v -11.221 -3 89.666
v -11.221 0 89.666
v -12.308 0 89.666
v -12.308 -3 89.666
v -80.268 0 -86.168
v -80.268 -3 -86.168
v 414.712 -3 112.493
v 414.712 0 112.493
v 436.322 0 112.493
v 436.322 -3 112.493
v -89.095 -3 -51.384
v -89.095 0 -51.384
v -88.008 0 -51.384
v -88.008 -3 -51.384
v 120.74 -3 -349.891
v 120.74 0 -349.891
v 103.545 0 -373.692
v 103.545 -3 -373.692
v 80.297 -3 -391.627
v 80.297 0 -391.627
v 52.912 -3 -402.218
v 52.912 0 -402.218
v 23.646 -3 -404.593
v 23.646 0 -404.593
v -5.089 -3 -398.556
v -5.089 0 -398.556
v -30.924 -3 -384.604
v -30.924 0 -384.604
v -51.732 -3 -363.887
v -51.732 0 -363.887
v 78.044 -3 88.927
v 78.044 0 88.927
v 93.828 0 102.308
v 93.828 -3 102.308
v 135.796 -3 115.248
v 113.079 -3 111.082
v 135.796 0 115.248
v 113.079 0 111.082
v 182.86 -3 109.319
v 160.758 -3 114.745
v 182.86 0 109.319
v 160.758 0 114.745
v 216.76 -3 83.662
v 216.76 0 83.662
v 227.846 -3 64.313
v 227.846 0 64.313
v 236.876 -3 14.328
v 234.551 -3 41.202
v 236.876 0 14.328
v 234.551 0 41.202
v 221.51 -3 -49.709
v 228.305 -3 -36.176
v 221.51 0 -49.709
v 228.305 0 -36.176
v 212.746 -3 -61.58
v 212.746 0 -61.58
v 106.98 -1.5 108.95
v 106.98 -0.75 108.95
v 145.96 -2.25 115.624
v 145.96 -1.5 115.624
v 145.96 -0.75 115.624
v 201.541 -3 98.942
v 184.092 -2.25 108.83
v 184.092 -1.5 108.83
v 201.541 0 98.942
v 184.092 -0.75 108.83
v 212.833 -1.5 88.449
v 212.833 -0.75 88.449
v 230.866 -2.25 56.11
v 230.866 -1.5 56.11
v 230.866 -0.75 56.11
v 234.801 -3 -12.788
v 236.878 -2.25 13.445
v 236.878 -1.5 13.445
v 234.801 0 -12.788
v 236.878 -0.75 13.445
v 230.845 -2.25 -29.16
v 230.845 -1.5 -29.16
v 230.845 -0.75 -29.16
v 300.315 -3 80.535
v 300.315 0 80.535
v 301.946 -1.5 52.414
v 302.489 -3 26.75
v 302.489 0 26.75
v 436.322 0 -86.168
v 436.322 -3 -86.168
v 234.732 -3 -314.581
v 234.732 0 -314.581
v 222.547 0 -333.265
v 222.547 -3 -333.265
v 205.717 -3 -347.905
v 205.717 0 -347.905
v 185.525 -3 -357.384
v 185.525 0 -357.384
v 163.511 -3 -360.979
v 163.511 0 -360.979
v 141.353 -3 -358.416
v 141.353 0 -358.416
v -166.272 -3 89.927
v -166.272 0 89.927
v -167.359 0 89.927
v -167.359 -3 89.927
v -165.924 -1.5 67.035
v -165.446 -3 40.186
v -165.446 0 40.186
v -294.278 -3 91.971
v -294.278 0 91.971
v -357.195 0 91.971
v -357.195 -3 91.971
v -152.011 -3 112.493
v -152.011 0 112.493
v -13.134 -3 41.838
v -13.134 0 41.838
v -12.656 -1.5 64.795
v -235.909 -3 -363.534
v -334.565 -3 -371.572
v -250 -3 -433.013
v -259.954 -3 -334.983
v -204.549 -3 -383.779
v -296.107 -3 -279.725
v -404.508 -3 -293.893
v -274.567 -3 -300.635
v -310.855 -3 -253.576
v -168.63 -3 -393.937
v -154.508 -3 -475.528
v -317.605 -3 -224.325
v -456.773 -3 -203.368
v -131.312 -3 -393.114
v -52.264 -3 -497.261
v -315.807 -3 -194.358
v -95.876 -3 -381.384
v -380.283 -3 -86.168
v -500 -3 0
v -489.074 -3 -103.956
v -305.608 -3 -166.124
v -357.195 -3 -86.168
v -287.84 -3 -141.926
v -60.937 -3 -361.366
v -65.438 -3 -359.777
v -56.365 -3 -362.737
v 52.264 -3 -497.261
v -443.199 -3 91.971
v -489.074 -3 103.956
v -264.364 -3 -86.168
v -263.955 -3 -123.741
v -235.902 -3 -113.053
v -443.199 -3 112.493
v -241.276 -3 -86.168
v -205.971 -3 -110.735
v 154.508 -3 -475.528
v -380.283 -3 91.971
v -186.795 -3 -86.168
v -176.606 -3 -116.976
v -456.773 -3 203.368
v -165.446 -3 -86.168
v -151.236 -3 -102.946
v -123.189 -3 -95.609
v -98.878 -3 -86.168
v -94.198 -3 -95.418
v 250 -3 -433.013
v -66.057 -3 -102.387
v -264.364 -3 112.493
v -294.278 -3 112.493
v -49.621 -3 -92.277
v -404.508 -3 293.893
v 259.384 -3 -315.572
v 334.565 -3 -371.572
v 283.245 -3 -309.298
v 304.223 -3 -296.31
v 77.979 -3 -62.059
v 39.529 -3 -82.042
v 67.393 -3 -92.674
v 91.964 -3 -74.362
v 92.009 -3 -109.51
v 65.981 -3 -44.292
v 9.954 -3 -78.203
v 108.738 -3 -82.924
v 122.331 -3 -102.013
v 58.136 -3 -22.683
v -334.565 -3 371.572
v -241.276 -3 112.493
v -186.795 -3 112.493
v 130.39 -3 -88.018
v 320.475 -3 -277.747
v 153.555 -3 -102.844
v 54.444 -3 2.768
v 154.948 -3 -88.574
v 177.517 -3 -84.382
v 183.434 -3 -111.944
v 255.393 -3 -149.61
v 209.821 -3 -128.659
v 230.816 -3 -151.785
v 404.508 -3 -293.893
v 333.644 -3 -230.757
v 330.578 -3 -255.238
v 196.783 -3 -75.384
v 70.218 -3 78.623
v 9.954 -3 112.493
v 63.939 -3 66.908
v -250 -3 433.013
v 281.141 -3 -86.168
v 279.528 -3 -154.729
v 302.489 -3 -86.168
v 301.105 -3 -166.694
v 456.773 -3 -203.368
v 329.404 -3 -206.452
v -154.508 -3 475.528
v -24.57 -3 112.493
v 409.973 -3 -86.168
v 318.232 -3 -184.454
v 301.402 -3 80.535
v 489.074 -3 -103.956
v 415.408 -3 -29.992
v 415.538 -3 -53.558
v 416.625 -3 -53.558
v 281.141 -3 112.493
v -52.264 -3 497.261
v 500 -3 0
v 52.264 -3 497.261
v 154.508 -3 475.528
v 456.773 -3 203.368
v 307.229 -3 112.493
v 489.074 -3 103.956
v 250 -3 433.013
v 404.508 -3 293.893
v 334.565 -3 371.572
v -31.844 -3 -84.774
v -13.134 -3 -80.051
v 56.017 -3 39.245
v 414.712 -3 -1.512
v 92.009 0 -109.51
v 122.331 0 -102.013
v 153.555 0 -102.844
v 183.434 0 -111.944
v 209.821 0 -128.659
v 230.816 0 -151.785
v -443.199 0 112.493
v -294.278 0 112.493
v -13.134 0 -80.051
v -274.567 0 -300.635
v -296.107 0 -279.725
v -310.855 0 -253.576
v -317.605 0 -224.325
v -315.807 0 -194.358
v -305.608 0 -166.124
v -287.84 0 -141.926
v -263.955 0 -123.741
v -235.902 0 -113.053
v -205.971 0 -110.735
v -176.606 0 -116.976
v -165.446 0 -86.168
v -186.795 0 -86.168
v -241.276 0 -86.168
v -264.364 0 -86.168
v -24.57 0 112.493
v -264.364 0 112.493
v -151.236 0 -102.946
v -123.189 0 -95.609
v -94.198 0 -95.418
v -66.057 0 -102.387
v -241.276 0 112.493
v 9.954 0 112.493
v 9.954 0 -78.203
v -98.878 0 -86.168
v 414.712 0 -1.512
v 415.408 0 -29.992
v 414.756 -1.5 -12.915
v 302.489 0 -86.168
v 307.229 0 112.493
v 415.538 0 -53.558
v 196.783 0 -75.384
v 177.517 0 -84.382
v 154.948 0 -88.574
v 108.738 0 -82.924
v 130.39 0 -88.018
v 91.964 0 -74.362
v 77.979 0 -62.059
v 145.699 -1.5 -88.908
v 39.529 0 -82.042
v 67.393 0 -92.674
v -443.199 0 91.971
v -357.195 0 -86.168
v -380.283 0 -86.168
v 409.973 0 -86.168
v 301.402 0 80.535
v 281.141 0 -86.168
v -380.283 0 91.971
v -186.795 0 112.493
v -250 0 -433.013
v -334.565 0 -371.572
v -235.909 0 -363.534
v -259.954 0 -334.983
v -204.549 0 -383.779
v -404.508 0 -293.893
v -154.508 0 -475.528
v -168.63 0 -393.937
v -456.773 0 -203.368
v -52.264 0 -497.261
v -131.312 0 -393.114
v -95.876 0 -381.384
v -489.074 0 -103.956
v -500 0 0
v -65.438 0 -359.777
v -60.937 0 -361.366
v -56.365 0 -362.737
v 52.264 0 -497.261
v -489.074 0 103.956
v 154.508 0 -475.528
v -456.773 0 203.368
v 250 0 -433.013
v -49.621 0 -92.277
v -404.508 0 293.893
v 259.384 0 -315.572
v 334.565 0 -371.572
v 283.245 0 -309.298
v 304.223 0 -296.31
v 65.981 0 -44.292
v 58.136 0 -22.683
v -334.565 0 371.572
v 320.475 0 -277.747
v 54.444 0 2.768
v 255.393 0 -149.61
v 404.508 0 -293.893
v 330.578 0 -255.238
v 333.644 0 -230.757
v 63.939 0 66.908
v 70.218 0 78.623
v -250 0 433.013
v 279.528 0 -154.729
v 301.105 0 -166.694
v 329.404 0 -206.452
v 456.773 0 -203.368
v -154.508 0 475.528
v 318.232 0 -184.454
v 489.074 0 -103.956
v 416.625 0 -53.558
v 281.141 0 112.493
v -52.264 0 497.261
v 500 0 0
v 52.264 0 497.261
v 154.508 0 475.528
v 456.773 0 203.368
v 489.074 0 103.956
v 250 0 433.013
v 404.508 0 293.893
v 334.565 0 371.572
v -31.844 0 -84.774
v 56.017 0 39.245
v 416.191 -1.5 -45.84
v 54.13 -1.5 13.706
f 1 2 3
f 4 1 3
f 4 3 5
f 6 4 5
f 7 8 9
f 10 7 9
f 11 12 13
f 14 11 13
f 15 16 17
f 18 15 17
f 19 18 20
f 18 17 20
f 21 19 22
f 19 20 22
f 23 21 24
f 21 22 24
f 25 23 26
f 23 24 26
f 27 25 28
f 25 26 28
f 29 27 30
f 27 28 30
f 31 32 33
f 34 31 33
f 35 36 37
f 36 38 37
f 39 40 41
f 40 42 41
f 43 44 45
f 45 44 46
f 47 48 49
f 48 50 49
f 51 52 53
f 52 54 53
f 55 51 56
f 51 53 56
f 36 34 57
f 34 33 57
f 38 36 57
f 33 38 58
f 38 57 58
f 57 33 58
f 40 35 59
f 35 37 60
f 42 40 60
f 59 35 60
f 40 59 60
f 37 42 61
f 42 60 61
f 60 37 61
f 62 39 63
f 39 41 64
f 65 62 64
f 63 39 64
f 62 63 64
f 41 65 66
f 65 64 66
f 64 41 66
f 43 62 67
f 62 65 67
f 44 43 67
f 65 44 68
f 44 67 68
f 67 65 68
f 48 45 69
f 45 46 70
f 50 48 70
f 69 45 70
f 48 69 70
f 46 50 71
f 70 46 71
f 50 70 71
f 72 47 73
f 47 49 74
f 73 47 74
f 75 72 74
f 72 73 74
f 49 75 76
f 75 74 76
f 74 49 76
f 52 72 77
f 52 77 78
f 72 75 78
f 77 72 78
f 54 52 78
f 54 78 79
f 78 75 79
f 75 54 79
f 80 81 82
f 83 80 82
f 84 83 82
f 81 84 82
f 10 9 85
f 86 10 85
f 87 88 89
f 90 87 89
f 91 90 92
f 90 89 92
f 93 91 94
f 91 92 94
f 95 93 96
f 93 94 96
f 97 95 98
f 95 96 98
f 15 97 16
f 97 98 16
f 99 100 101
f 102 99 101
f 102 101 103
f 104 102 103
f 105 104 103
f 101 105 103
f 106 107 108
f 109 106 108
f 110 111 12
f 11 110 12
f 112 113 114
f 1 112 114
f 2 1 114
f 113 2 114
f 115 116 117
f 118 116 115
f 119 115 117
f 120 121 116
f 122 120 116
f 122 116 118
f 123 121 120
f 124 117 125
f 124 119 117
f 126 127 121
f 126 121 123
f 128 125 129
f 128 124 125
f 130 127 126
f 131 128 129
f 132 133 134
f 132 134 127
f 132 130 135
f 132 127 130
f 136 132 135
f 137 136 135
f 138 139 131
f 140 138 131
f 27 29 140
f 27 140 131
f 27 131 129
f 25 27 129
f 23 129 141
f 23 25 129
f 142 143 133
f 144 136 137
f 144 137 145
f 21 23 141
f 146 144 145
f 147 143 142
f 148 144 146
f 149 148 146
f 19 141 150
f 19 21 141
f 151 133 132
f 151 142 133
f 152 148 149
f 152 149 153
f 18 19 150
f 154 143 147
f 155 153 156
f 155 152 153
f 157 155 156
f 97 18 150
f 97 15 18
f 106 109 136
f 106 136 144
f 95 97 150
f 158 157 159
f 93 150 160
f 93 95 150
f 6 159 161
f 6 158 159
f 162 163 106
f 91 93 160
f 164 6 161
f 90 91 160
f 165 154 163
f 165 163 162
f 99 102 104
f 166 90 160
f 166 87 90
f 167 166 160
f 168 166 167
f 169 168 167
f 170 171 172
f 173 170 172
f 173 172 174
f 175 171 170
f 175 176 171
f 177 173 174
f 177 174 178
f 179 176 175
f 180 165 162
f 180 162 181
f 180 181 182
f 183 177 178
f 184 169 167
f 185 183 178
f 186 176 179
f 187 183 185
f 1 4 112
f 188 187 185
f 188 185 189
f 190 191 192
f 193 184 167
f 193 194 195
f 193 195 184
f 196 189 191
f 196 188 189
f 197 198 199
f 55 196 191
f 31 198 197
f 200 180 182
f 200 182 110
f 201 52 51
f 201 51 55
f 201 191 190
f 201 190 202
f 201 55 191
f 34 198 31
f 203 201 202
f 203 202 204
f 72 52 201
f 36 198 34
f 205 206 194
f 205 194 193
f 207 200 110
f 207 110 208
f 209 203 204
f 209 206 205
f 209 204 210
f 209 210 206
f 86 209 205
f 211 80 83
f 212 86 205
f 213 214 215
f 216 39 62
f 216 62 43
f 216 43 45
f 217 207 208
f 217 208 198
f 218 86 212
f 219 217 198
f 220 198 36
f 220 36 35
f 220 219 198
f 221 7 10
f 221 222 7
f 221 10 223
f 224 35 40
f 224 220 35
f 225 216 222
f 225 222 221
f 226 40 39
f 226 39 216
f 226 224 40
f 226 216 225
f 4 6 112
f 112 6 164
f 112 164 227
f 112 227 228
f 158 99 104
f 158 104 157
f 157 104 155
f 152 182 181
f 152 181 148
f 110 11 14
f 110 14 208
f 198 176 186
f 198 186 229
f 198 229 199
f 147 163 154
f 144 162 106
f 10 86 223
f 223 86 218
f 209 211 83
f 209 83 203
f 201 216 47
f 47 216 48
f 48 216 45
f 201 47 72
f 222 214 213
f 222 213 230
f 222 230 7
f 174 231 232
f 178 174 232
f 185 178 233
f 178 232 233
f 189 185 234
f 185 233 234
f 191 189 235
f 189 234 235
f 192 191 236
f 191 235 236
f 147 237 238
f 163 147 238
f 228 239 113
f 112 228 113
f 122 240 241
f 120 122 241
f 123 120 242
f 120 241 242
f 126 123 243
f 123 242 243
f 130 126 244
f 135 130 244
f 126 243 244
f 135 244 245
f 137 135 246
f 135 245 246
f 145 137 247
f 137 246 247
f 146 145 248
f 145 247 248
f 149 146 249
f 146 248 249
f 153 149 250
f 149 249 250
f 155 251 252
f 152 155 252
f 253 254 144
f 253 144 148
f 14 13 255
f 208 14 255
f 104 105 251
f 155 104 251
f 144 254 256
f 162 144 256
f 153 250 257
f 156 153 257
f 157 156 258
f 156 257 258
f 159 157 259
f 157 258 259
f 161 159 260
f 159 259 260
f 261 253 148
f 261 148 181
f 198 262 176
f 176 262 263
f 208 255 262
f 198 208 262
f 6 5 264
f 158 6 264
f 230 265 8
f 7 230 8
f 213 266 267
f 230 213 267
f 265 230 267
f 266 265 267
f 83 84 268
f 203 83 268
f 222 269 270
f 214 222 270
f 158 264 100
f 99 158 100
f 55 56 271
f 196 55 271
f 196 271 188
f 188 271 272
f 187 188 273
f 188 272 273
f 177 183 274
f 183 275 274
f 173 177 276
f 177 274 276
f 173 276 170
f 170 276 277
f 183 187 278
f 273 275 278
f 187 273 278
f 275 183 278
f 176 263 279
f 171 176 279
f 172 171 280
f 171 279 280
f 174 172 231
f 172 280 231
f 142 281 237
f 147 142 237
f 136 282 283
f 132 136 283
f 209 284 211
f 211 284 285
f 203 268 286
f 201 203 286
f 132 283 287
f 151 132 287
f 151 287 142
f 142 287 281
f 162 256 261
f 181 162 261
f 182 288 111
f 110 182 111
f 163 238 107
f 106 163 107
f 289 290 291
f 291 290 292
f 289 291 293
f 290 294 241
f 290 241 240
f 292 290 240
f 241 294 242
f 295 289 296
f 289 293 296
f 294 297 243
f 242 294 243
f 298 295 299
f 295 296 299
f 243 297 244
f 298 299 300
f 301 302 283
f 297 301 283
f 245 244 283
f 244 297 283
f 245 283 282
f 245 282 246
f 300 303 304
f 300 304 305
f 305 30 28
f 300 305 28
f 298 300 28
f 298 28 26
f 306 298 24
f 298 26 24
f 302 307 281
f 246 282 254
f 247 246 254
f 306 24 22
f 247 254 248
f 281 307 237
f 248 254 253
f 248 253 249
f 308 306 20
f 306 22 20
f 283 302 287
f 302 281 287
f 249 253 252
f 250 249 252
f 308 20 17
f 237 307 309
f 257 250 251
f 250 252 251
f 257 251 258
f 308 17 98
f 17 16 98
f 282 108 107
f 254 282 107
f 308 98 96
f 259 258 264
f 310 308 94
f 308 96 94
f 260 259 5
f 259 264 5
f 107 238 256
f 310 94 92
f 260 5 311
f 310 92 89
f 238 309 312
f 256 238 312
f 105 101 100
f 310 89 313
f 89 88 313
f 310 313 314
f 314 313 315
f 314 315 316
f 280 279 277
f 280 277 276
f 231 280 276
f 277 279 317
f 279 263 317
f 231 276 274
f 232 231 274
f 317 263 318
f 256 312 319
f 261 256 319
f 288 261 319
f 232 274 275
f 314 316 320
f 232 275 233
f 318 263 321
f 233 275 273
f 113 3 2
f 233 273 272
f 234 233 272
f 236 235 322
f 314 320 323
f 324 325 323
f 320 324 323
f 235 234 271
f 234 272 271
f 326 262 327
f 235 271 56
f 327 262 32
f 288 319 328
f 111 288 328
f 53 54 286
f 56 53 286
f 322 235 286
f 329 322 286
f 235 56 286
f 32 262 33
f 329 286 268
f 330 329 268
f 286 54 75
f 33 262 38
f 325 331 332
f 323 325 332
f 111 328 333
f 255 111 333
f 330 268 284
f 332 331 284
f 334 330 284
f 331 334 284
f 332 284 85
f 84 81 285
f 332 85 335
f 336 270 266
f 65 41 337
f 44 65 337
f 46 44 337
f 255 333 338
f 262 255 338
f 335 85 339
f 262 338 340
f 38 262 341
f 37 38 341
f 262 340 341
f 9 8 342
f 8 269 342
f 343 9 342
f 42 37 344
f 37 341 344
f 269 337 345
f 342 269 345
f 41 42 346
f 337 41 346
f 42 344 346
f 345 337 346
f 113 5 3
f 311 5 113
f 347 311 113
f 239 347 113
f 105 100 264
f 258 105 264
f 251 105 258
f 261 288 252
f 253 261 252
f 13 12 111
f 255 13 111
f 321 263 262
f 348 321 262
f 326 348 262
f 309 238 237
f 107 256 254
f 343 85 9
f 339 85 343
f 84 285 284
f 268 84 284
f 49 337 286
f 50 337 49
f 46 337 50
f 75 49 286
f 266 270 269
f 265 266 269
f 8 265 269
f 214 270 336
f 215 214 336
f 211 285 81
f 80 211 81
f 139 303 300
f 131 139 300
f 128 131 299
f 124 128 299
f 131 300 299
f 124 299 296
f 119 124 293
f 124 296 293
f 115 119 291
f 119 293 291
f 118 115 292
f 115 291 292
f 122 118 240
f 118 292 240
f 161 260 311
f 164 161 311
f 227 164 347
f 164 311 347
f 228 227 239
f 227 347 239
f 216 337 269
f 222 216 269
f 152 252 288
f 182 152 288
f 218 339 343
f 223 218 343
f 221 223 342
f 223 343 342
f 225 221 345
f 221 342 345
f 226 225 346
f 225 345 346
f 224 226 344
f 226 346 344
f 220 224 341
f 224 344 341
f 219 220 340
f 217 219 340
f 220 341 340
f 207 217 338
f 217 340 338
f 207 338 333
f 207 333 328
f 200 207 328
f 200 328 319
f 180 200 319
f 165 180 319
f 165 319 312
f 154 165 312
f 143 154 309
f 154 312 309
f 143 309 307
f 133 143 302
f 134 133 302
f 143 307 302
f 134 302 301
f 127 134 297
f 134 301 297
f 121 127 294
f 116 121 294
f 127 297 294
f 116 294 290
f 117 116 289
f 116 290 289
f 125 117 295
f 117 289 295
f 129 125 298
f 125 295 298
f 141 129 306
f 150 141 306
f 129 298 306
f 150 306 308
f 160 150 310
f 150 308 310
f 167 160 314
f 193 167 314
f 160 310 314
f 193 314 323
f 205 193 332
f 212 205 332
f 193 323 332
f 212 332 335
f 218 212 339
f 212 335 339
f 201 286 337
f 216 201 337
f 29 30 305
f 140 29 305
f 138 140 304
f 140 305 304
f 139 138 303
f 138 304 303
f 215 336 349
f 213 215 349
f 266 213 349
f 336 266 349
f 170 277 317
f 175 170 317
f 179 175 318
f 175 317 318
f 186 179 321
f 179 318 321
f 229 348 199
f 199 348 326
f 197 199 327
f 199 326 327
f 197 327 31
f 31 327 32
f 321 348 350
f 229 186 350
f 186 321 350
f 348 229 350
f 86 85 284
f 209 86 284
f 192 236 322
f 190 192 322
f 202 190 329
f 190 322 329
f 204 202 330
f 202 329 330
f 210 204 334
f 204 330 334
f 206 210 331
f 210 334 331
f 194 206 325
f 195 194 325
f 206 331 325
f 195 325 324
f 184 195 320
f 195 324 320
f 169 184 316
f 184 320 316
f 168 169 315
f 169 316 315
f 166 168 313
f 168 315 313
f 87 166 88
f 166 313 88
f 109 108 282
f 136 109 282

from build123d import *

# Parameters (mm, degrees)
F0_R     = 500
F0_W     = 23.0880718875
F0_H     = 198.6617711001
F1_DEPTH = 3


with BuildPart() as f1:
    # F0 (on Front) → F1 (new body)
    with BuildSketch(Plane.XZ):
        Circle(F0_R)
        with BuildLine():
            ThreePointArc((-274.567418569, -300.6351906095), (-305.6079419009, -166.1235155196), (-176.6063983823, -116.975711967))
            ThreePointArc((-176.6063983823, -116.975711967), (-123.1889327411, -95.6085057867), (-66.0571388124, -102.3865038656))
            ThreePointArc((-66.0571388124, -102.3865038656), (-40.8752164599, -88.187383642), (-13.1344654752, -80.0513549242))
            Line((-13.1344654752, -80.0513549242), (-13.1344654752, 41.8377829303))
            add(Edge.make_bspline(
                [(-13.1344654752, 41.8377829303), (-13.1344654752, 63.8388457836), (-11.2213295749, 89.6661804375)],
                knots=[0, 0, 0, 1, 1, 1], degree=2))
            Line((-11.2213295749, 89.6661804375), (-12.3083386092, 89.6661804375))
            Line((-12.3083386092, 89.6661804375), (-80.2681434307, -86.1684009433))
            Line((-80.2681434307, -86.1684009433), (-98.8777380971, -86.1684009433))
            Line((-98.8777380971, -86.1684009433), (-166.2722982207, 89.9270626057))
            Line((-166.2722982207, 89.9270626057), (-167.359307255, 89.9270626057))
            add(Edge.make_bspline(
                [(-167.359307255, 89.9270626057), (-165.4461713547, 69.0130087867), (-165.4461713547, 40.1855291983)],
                knots=[0, 0, 0, 1, 1, 1], degree=2))
            Line((-165.4461713547, 40.1855291983), (-165.4461713547, -86.1684009433))
            Line((-165.4461713547, -86.1684009433), (-186.7950287874, -86.1684009433))
            Line((-186.7950287874, -86.1684009433), (-186.7950287874, 112.4933701568))
            Line((-186.7950287874, 112.4933701568), (-152.0107396913, 112.4933701568))
            Line((-152.0107396913, 112.4933701568), (-89.0946567888, -51.3841118472))
            Line((-89.0946567888, -51.3841118472), (-88.0076477545, -51.3841118472))
            Line((-88.0076477545, -51.3841118472), (-24.5698005155, 112.4933701568))
            Line((-24.5698005155, 112.4933701568), (9.9536064123, 112.4933701568))
            Line((9.9536064123, 112.4933701568), (9.9536064123, -78.2026726688))
            ThreePointArc((9.9536064123, -78.2026726688), (53.773823289, -86.5372862236), (92.0090216607, -109.5100264977))
            ThreePointArc((92.0090216607, -109.5100264977), (168.8010036172, -106.3879816048), (230.8163361906, -151.7846134505))
            ThreePointArc((230.8163361906, -151.7846134505), (301.8959936917, -167.3086216291), (333.6679179608, -232.7598047248))
            ThreePointArc((333.6679179608, -232.7598047248), (303.4547141219, -296.9531582441), (234.7315185471, -314.581167554))
            ThreePointArc((234.7315185471, -314.581167554), (185.5253099789, -357.3835232893), (120.7398090278, -349.8914284782))
            ThreePointArc((120.7398090278, -349.8914284782), (38.3642732882, -404.4610167035), (-51.7318220906, -363.886856885))
            ThreePointArc((-51.7318220905, -363.886856885), (-58.6591581618, -362.0786424357), (-65.4384116096, -359.7766113262))
            ThreePointArc((-65.4384116096, -359.7766113262), (-186.9682580881, -390.1967718511), (-274.567418569, -300.6351906095))
        make_face(mode=Mode.SUBTRACT)
        Polygon((-357.1945649969, 91.9706395901), (-357.1945649969, -86.1684009433), (-380.2826368844, -86.1684009433), (-380.2826368844, 91.9706395901), (-443.198719787, 91.9706395901), (-443.198719787, 112.4933701568), (-294.2784820944, 112.4933701568), (-294.2784820944, 91.9706395901), align=None, mode=Mode.SUBTRACT)
        with Locations((-252.819957528, 13.1624846067)):
            Rectangle(F0_W, F0_H, mode=Mode.SUBTRACT)
        with BuildLine():
            add(Edge.make_bspline(
                [(212.8329725653, 88.4487303191), (236.877612403, 61.2735044628), (236.877612403, 13.4451069557)],
                knots=[0, 0, 0, 1, 1, 1], degree=2))
            add(Edge.make_bspline(
                [(236.877612403, 13.4451069557), (236.877612403, -34.2528494674), (212.7460118425, -61.5802565885)],
                knots=[0, 0, 0, 1, 1, 1], degree=2))
            add(Edge.make_bspline(
                [(212.7460118425, -61.5802565885), (188.6144112821, -88.9076637096), (145.6992946098, -88.9076637096)],
                knots=[0, 0, 0, 1, 1, 1], degree=2))
            add(Edge.make_bspline(
                [(145.6992946098, -88.9076637096), (101.8276099874, -88.9076637096), (77.9786317759, -62.0585405636)],
                knots=[0, 0, 0, 1, 1, 1], degree=2))
            add(Edge.make_bspline(
                [(77.9786317759, -62.0585405636), (54.1296535644, -35.2094174175), (54.1296535644, 13.7059891239)],
                knots=[0, 0, 0, 1, 1, 1], degree=2))
            add(Edge.make_bspline(
                [(54.1296535644, 13.7059891239), (54.1296535644, 62.2300724129), (78.0438523179, 88.9270142942)],
                knots=[0, 0, 0, 1, 1, 1], degree=2))
            add(Edge.make_bspline(
                [(78.0438523179, 88.9270142942), (101.9580510715, 115.6239561754), (145.9601767781, 115.6239561754)],
                knots=[0, 0, 0, 1, 1, 1], degree=2))
            add(Edge.make_bspline(
                [(145.9601767781, 115.6239561754), (188.7883327276, 115.6239561754), (212.8329725653, 88.4487303191)],
                knots=[0, 0, 0, 1, 1, 1], degree=2))
        make_face(mode=Mode.SUBTRACT)
        with BuildLine():
            Line((436.3220300077, 112.4933701568), (436.3220300077, -86.1684009433))
            Line((436.3220300077, -86.1684009433), (409.9729310174, -86.1684009433))
            Line((409.9729310174, -86.1684009433), (301.4024686762, 80.5353045497))
            Line((301.4024686762, 80.5353045497), (300.315459642, 80.5353045497))
            add(Edge.make_bspline(
                [(300.315459642, 80.5353045497), (302.4894777105, 51.1860606249), (302.4894777105, 26.7500975349)],
                knots=[0, 0, 0, 1, 1, 1], degree=2))
            Line((302.4894777105, 26.7500975349), (302.4894777105, -86.1684009433))
            Line((302.4894777105, -86.1684009433), (281.1406202777, -86.1684009433))
            Line((281.1406202777, -86.1684009433), (281.1406202777, 112.4933701568))
            Line((281.1406202777, 112.4933701568), (307.2288370998, 112.4933701568))
            Line((307.2288370998, 112.4933701568), (415.5384172728, -53.5581299157))
            Line((415.5384172728, -53.5581299157), (416.625426307, -53.5581299157))
            add(Edge.make_bspline(
                [(416.625426307, -53.5581299157), (416.3645441388, -49.9057795606), (415.4079761886, -29.9917740531)],
                knots=[0, 0, 0, 1, 1, 1], degree=2))
            add(Edge.make_bspline(
                [(415.4079761886, -29.9917740531), (414.4514082385, -10.0777685456), (414.7122904067, -1.5121373557)],
                knots=[0, 0, 0, 1, 1, 1], degree=2))
            Line((414.7122904067, -1.5121373557), (414.7122904067, 112.4933701568))
            Line((414.7122904067, 112.4933701568), (436.3220300077, 112.4933701568))
        make_face(mode=Mode.SUBTRACT)
    extrude(amount=F1_DEPTH)


solid = f1.part
